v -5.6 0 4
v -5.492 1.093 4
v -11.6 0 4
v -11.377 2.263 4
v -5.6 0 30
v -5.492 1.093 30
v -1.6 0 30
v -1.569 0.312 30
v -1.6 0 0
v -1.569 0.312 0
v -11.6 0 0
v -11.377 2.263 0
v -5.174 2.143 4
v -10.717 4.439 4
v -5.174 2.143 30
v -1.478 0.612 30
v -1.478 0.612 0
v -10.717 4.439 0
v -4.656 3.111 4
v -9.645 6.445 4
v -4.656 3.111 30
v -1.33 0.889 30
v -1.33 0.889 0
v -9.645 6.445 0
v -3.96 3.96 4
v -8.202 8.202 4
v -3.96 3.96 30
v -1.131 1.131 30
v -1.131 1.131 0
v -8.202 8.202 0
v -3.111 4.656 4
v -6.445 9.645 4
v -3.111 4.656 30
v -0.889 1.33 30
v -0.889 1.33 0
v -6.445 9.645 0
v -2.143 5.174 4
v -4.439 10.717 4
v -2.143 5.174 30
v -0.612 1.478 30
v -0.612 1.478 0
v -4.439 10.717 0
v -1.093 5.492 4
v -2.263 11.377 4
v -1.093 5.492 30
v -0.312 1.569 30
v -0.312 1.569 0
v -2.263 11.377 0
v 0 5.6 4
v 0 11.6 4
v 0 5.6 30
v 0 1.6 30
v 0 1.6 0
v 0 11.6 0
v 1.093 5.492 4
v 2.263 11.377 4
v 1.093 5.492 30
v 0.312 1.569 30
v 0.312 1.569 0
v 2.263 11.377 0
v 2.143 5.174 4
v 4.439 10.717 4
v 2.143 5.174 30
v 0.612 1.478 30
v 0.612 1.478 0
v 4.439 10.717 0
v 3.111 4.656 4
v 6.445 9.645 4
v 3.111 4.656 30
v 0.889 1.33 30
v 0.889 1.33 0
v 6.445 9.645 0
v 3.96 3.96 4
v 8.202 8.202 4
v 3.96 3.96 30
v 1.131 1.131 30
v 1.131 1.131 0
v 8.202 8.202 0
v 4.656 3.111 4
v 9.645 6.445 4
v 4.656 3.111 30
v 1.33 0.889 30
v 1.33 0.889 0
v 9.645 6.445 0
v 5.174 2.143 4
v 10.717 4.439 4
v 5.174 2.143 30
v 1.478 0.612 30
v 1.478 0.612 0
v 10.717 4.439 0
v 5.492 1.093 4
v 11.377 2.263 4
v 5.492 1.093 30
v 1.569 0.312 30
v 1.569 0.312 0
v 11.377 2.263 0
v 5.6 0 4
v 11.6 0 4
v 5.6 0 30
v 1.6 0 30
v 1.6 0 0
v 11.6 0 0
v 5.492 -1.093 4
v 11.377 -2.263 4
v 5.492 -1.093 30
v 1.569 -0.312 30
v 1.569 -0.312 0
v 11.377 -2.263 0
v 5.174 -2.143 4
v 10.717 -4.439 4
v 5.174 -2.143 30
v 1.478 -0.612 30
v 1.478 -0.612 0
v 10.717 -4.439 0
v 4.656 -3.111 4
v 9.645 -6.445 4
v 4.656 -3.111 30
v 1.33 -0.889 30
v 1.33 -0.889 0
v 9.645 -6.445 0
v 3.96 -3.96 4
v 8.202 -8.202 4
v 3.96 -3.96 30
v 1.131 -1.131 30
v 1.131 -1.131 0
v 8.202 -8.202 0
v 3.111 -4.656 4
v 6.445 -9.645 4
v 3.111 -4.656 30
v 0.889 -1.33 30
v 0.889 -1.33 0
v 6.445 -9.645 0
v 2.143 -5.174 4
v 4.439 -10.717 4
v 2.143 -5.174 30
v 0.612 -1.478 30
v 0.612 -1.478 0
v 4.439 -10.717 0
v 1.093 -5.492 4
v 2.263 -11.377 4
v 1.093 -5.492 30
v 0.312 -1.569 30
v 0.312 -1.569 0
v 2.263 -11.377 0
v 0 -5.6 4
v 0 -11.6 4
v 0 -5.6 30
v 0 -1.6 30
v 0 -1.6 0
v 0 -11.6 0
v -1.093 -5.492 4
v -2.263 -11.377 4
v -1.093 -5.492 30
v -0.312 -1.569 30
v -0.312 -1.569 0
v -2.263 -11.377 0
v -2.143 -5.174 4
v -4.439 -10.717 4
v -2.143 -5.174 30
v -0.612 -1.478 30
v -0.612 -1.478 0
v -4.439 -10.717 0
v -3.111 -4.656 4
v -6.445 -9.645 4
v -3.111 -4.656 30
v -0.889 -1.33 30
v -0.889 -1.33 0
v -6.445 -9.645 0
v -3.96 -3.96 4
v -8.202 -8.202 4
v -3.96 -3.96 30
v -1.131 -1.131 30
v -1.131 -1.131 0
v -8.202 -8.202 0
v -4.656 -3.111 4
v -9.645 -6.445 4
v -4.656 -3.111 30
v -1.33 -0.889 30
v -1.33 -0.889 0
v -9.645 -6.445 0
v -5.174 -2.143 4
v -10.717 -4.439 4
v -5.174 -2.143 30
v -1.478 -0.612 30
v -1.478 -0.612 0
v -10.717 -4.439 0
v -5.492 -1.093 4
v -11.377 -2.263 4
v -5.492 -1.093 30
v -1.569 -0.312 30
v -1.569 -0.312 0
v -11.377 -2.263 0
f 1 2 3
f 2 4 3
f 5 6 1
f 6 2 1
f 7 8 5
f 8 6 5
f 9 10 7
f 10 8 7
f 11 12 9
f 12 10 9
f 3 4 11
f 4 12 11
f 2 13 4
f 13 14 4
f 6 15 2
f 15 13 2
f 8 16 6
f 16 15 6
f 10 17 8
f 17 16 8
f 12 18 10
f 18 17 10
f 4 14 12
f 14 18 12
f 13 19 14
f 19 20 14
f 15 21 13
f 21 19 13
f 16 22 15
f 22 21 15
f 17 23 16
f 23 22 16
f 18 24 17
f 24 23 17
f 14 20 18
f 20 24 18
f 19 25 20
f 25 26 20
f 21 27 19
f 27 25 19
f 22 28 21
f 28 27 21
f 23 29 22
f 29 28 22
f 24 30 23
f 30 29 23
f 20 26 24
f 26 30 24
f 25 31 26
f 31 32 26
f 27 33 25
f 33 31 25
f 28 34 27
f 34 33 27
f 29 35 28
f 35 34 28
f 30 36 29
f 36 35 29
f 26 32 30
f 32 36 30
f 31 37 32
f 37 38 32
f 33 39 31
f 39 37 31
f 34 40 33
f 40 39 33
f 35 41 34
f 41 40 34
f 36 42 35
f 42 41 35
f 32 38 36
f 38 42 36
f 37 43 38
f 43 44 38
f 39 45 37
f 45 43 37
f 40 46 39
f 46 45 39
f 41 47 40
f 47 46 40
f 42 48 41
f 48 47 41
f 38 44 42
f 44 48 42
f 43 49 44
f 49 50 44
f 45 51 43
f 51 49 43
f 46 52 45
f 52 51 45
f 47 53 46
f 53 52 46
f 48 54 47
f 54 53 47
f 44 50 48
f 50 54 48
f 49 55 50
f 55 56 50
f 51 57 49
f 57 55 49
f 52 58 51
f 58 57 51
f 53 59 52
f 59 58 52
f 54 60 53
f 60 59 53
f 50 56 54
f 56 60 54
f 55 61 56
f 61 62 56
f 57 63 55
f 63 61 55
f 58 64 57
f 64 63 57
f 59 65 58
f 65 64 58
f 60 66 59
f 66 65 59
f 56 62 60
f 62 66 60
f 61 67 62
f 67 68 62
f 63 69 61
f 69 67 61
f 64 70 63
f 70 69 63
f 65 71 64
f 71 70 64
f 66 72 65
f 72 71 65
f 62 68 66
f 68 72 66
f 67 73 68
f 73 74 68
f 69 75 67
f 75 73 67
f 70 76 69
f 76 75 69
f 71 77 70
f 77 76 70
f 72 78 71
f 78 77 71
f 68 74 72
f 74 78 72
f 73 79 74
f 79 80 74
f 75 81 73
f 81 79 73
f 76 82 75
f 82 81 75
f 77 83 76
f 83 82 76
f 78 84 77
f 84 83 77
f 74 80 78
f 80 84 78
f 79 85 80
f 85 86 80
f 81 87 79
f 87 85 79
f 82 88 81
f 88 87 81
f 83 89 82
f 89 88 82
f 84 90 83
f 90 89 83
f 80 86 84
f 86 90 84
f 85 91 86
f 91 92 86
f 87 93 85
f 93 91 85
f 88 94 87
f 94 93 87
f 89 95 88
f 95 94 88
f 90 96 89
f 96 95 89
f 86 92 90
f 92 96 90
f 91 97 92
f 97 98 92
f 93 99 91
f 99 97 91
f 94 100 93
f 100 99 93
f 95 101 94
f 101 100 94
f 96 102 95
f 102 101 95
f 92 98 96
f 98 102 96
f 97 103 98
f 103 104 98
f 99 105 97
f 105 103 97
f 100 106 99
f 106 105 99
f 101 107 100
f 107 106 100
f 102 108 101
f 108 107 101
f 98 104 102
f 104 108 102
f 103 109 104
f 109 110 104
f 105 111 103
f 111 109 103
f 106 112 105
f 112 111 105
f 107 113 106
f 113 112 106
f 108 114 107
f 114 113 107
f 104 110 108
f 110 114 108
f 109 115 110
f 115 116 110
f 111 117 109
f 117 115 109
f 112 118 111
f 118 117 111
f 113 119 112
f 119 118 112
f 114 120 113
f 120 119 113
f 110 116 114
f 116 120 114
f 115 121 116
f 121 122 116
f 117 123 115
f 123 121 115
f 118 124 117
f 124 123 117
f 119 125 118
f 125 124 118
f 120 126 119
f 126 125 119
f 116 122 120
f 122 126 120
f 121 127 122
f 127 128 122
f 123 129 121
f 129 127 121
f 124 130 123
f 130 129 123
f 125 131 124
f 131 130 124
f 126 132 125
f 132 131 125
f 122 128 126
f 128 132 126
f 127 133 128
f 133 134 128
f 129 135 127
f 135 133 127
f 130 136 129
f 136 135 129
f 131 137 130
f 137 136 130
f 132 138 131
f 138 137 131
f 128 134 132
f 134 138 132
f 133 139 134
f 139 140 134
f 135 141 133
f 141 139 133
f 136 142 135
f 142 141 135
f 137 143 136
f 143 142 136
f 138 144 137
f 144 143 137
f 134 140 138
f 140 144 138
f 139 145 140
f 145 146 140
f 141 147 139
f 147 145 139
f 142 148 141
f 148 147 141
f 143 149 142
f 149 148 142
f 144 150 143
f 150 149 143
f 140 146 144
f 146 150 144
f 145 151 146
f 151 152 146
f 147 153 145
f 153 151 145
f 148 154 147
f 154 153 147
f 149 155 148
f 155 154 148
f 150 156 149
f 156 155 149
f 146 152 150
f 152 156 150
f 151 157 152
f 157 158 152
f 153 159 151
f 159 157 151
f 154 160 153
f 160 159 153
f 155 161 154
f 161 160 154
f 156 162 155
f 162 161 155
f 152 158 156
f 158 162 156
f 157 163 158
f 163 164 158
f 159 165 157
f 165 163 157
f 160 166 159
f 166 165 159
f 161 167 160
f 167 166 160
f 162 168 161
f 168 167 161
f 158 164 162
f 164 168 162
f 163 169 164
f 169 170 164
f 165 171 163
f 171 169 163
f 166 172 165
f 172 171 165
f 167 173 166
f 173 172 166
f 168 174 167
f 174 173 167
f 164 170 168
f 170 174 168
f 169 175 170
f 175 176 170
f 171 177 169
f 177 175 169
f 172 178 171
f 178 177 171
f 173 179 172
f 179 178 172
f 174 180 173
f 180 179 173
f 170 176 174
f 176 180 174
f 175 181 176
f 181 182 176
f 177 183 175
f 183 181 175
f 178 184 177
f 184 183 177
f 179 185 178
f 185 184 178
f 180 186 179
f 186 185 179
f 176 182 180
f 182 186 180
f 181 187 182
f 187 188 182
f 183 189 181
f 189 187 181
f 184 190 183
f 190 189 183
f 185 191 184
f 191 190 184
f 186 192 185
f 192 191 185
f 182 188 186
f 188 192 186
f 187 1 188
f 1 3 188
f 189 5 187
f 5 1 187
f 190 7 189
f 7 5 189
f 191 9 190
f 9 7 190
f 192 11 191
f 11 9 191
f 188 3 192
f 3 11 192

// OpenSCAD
$fn = 32;

// ----------------------------------------------------------------------
// Profiled standoff: flanged spacer, 30 mm long, bore 3.2 mm
// ----------------------------------------------------------------------

// --- parameters (mm) ---
revolve_angle = 360;      // full turn around the Z axis
profile_points = 6;       // points of the closed outline

profile = [[1.6, 0], [11.6, 0], [11.6, 4], [5.6, 4], [5.6, 30], [1.6, 30]];  // single closed polygon, 6 points, counter clockwise

// --- the one profile operation ---
rotate_extrude(angle = revolve_angle) polygon(points = profile);
